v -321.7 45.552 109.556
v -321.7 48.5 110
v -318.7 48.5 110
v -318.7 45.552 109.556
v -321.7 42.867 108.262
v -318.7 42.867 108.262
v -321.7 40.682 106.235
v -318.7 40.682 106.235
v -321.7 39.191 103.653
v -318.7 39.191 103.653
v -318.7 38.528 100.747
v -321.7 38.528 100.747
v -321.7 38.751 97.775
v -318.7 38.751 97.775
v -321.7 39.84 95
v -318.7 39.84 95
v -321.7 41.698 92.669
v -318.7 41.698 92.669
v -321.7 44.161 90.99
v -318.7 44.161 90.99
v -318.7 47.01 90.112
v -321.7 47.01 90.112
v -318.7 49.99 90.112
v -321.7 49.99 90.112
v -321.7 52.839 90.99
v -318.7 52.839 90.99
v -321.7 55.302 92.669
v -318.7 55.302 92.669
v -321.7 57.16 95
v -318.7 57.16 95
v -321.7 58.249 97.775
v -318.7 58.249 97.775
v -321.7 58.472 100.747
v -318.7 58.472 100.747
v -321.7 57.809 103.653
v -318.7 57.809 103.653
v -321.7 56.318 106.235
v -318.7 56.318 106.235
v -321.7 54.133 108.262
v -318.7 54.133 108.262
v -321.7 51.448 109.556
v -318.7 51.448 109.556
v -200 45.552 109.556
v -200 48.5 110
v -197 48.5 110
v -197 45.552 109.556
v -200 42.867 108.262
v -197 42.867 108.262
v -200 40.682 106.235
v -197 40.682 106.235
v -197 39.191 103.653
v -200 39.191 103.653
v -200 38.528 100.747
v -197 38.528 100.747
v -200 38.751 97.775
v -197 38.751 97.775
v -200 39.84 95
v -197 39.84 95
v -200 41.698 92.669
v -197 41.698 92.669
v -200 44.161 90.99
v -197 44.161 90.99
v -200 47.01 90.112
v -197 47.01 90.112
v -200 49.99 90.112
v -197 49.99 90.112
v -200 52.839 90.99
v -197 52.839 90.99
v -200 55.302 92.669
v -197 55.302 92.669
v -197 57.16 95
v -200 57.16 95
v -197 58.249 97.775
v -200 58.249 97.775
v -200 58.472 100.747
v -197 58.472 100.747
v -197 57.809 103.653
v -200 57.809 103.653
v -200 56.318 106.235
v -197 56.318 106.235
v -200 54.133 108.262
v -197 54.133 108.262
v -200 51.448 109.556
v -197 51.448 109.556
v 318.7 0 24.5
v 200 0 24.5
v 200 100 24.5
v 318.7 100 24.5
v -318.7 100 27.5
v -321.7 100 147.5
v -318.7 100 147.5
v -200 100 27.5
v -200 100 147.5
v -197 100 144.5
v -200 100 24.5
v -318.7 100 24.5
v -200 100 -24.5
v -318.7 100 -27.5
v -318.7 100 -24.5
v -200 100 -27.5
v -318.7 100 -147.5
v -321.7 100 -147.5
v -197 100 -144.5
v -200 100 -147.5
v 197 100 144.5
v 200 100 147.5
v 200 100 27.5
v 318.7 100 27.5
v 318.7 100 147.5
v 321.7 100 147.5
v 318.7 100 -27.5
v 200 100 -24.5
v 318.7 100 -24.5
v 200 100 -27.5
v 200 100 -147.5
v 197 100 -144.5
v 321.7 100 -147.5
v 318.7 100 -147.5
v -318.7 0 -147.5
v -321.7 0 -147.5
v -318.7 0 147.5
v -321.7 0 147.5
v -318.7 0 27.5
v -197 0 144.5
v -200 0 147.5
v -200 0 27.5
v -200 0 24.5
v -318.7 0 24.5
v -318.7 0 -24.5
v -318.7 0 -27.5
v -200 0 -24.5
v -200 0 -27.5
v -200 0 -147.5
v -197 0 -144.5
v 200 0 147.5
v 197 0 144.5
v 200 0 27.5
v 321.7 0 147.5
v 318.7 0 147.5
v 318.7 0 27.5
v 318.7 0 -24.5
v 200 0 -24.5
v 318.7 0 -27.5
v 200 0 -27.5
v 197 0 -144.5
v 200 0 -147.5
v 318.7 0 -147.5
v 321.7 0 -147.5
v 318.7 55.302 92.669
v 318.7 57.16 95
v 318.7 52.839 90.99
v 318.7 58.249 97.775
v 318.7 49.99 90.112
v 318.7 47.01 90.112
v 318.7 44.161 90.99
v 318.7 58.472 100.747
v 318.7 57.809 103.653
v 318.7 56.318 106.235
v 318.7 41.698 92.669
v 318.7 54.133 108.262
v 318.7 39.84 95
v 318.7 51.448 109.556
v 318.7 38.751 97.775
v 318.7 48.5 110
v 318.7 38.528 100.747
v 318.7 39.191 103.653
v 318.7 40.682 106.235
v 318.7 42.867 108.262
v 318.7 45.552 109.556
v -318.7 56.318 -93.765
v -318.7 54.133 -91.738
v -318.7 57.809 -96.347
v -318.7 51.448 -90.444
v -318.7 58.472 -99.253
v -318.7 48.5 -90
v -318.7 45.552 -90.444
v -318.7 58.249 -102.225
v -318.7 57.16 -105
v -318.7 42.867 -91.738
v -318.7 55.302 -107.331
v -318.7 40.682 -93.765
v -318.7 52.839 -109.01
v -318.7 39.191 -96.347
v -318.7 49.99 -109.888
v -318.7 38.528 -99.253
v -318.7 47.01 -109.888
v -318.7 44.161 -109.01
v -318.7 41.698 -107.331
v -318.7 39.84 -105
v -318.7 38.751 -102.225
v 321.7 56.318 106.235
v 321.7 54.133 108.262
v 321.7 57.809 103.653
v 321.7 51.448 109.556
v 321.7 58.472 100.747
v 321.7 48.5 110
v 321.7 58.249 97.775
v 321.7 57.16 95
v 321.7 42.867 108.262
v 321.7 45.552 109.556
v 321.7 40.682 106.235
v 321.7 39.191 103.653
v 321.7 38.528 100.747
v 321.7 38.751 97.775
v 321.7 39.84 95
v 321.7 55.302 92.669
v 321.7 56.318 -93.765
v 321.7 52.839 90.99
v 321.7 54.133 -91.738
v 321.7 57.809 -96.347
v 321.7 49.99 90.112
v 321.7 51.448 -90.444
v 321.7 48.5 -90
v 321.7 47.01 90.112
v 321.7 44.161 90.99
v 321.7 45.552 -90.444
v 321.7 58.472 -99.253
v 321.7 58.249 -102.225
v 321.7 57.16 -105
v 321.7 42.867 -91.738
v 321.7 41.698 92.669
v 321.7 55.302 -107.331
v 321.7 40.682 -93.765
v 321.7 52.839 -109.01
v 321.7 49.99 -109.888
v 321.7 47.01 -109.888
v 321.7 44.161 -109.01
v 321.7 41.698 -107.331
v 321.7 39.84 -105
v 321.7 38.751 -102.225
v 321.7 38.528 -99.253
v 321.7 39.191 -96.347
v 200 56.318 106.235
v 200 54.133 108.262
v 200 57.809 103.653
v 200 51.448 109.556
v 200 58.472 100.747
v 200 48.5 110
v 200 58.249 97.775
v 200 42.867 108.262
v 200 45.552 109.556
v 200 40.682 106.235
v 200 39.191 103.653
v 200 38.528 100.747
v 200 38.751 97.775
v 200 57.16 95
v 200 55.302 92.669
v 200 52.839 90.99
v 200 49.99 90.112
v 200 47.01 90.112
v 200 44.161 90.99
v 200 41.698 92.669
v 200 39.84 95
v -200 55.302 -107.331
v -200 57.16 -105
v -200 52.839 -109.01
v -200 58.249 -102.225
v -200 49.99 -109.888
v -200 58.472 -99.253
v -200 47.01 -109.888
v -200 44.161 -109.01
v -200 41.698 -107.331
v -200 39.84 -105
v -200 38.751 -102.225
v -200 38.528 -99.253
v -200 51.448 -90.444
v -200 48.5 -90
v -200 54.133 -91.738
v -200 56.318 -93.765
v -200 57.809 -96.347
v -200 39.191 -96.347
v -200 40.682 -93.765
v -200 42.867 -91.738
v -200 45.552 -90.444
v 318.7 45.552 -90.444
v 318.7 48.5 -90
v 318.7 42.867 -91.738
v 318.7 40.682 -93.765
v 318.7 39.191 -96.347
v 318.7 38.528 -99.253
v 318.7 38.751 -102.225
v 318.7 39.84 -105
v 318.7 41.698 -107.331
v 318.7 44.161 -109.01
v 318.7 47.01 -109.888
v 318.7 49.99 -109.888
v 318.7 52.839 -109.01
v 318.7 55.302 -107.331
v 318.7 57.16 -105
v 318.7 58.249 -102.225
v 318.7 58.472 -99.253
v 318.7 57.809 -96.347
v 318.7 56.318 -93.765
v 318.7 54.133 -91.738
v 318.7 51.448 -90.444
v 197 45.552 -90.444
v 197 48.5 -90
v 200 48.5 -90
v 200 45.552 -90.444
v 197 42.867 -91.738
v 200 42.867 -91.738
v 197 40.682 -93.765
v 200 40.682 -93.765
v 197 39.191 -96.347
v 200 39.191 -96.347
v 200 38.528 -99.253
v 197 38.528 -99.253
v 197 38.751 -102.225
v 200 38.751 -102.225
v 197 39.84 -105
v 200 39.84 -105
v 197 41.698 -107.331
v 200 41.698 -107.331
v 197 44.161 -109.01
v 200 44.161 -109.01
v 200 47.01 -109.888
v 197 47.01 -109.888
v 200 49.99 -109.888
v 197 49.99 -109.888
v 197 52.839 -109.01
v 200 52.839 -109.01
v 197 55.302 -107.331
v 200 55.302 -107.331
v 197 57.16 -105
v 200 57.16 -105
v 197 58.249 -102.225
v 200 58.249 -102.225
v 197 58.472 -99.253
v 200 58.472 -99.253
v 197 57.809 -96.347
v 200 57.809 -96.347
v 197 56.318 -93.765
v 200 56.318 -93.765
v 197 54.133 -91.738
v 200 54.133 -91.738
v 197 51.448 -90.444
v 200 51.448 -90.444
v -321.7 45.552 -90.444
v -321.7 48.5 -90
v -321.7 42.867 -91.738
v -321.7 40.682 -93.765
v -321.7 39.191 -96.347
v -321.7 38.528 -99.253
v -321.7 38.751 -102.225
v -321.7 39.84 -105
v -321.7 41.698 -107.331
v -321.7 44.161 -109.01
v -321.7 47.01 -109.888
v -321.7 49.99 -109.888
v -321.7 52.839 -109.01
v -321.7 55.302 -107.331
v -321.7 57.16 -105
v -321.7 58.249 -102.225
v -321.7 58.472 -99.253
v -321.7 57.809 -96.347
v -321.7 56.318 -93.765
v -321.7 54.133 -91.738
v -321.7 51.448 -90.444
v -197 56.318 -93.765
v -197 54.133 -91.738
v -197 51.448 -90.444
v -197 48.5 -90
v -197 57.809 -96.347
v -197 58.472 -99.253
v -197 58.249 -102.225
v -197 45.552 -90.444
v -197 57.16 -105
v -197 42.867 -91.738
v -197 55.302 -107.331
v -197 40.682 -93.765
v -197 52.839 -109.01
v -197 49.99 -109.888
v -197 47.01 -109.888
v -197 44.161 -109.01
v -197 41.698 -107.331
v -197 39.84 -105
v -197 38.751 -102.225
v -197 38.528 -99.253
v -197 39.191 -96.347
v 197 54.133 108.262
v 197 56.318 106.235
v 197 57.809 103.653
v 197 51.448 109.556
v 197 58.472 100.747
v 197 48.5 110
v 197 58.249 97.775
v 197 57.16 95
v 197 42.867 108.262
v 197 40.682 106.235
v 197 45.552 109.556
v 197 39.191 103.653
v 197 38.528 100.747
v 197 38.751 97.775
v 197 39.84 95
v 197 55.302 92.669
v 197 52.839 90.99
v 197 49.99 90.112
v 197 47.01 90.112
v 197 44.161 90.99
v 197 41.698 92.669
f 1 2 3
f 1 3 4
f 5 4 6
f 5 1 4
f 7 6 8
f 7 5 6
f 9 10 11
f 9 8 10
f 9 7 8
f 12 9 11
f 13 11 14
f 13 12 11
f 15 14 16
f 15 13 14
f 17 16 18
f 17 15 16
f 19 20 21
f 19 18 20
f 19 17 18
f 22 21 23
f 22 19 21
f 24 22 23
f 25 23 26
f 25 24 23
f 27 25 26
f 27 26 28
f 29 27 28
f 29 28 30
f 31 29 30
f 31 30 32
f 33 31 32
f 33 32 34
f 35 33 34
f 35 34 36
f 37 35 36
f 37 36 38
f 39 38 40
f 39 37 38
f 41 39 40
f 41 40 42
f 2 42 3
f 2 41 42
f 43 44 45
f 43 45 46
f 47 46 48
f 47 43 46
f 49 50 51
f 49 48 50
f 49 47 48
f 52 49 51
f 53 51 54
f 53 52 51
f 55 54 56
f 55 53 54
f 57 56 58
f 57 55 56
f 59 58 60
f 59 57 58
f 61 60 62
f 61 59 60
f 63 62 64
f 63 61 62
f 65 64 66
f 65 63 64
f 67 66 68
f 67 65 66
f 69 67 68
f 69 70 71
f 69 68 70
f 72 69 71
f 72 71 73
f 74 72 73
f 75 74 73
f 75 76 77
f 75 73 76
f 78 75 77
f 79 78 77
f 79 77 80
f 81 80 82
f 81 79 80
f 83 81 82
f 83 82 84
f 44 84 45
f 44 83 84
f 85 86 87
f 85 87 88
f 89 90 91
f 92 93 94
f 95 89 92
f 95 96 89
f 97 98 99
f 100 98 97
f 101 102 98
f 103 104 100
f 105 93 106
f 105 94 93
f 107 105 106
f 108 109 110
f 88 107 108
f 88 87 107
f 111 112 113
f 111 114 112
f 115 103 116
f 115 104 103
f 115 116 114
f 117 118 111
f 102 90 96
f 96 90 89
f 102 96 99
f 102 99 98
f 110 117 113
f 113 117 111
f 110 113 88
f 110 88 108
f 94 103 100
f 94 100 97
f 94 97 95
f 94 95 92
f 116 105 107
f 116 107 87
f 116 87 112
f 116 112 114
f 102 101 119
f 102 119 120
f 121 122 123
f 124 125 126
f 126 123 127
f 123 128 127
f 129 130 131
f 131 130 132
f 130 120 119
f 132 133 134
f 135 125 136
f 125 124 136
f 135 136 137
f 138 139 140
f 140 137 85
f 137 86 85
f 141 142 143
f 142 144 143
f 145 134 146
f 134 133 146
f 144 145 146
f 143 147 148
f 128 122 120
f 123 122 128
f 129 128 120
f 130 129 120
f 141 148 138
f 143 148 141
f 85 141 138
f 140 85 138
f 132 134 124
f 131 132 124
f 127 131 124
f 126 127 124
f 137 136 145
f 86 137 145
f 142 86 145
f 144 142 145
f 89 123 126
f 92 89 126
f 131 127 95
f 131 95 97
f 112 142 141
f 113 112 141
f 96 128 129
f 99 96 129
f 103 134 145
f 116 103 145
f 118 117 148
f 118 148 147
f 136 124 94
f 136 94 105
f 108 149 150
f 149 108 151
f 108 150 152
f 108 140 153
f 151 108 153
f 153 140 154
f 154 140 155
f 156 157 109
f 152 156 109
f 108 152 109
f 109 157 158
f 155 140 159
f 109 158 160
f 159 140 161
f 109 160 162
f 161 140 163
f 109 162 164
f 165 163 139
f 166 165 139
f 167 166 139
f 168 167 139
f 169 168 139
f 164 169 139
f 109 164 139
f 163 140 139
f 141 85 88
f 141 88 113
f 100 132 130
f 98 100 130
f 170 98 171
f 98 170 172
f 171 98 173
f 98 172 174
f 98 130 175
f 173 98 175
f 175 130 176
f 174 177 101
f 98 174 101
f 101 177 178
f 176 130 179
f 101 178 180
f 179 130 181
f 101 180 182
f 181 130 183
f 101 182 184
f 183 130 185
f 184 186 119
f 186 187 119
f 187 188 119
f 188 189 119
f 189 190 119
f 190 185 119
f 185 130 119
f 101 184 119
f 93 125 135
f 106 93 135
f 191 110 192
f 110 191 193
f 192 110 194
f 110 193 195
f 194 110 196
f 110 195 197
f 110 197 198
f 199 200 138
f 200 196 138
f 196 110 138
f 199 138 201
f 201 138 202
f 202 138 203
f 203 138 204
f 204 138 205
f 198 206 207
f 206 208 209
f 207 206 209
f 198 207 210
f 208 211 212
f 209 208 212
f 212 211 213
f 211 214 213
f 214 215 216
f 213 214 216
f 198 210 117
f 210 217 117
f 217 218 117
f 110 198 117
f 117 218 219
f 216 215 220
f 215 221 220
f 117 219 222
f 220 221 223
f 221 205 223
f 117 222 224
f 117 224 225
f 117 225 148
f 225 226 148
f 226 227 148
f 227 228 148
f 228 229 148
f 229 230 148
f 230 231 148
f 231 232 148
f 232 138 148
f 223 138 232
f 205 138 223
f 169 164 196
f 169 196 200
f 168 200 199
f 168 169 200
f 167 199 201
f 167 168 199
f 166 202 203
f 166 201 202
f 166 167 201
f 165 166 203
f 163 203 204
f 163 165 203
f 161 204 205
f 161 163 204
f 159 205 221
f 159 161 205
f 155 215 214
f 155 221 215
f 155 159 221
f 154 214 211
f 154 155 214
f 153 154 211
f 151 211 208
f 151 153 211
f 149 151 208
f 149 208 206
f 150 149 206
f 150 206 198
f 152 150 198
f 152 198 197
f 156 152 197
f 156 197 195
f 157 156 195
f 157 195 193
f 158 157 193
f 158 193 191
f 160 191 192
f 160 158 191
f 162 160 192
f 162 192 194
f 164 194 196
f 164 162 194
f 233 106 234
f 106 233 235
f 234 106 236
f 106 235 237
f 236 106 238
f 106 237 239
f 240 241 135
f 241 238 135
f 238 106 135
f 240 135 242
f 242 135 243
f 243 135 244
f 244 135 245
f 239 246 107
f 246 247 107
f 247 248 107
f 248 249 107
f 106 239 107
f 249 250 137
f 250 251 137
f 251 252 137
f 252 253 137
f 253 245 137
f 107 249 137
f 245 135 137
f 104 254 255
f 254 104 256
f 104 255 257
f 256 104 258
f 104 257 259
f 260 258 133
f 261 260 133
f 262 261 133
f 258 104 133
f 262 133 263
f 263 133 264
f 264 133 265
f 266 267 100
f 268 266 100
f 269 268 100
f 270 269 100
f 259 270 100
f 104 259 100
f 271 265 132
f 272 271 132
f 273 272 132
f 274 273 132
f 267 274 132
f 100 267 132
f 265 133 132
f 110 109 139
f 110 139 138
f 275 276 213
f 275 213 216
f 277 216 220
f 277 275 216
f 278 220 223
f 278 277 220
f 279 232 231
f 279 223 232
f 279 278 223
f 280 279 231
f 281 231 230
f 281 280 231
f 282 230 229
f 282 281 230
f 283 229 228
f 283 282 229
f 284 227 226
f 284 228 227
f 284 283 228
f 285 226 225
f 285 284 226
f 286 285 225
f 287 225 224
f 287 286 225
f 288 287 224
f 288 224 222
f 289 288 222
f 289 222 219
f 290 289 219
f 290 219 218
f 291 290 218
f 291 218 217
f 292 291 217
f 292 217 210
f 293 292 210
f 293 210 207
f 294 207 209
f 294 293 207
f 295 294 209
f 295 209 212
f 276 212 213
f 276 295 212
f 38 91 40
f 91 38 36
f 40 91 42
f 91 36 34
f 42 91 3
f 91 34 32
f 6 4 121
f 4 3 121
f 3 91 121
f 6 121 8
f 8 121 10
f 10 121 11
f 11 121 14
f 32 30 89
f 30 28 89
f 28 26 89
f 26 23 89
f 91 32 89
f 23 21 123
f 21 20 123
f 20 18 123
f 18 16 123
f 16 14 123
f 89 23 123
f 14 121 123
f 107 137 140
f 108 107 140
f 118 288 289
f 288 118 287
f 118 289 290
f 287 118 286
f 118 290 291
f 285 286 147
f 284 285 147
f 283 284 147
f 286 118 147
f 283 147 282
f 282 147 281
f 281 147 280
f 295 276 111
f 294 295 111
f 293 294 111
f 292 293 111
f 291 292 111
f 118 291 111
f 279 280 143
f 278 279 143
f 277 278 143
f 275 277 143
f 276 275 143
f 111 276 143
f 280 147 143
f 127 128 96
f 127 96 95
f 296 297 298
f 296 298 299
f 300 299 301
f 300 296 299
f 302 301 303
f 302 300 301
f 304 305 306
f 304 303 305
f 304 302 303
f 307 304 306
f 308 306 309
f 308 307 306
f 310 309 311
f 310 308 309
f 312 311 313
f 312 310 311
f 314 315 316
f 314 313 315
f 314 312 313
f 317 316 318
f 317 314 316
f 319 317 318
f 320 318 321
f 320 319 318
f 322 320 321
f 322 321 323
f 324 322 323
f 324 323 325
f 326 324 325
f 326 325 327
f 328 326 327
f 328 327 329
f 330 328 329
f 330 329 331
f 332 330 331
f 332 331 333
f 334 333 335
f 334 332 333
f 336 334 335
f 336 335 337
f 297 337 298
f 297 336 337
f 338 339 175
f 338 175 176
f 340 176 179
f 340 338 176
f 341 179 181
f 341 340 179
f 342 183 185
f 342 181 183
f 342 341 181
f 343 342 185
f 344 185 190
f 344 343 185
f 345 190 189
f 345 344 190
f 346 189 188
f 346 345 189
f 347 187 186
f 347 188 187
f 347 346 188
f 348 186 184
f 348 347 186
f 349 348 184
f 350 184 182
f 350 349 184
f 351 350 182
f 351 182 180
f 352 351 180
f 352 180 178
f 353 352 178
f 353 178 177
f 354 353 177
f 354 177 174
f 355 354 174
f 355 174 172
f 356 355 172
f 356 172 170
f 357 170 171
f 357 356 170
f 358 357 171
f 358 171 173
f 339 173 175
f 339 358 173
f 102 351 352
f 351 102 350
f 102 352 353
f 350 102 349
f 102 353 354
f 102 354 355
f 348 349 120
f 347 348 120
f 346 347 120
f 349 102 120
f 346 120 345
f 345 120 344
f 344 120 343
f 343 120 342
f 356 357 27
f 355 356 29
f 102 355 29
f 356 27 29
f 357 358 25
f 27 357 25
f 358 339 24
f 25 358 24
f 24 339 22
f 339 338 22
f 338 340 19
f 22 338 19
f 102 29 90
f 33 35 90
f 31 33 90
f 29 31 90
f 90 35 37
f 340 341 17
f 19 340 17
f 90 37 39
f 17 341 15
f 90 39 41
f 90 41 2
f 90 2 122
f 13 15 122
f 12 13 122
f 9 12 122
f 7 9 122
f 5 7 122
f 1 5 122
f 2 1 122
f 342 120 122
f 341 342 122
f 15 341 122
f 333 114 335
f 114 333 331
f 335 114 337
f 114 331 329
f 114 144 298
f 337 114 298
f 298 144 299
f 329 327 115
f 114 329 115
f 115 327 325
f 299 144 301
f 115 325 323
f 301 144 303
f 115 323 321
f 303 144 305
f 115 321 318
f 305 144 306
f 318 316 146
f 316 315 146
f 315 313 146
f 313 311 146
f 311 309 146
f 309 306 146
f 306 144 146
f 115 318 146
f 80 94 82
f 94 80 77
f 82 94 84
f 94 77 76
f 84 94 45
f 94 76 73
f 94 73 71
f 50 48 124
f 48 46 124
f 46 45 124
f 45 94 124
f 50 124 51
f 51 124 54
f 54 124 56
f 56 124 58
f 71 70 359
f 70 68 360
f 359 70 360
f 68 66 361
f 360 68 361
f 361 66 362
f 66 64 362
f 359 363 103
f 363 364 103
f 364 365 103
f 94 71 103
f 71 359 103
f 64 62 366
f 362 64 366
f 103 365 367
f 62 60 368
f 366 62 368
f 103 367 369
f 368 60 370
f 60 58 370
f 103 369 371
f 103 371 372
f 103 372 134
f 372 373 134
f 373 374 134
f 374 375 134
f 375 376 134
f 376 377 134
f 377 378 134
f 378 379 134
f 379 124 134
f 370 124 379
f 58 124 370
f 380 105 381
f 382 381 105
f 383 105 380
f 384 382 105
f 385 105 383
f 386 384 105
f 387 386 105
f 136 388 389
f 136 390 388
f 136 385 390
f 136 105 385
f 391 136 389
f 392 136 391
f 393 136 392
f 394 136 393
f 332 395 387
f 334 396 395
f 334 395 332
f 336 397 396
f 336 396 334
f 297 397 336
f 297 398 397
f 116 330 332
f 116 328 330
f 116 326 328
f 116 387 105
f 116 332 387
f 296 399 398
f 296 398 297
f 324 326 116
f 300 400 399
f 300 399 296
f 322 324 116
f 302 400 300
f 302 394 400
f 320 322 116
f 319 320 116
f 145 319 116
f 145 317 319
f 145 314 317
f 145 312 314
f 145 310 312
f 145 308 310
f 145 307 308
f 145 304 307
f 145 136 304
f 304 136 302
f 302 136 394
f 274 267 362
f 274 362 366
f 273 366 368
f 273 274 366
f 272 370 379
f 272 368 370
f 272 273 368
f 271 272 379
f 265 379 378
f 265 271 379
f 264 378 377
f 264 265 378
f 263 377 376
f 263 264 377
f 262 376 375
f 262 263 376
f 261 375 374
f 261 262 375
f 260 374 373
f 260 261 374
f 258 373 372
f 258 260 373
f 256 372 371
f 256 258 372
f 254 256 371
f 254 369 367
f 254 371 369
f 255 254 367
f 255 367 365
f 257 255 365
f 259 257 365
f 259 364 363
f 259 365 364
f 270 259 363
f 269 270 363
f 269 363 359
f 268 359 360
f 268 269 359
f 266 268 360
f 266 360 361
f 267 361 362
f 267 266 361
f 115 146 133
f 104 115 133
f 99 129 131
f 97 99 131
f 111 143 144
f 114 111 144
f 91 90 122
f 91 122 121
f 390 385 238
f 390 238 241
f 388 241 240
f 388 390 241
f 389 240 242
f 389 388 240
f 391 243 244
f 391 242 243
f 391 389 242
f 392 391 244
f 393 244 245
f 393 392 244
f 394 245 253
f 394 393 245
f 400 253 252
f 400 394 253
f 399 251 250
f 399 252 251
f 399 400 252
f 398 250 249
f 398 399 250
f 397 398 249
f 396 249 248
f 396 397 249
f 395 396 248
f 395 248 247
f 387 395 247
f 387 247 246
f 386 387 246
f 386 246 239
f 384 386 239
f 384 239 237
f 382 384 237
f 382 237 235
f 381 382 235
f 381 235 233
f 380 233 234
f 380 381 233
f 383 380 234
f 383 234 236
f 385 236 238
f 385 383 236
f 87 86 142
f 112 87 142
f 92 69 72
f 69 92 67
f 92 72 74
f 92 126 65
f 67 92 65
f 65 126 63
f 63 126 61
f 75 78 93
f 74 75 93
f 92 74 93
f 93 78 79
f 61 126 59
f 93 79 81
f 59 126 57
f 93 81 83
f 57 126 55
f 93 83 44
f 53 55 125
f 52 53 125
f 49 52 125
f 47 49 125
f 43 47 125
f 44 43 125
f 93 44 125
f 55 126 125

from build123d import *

# Parameters (mm, degrees)
SKETCH1_W               = 118.7
SKETCH1_H               = 49
SKETCH1_W_2             = 394
SKETCH1_H_2             = 289
BOSS_EXTRUDE1_DEPTH     = 100
CUT_EXTRUDE1_DEPTH      = 668.622505612
CUT_EXTRUDE1_DEPTH_BACK = 668.622505612
SKETCH3_R               = 10


with BuildPart() as part:
    # Sketch1 → Boss-Extrude1 (new body)
    with BuildSketch(Plane(origin=(0, 0, 0), x_dir=(1, 0, 0), z_dir=(0, 1, 0))):
        Polygon((200, 147.5), (-200, 147.5), (-200, 27.5), (-318.7, 27.5), (-318.7, 147.5), (-321.7, 147.5), (-321.7, -147.5), (-318.7, -147.5), (-318.7, -27.5), (-200, -27.5), (-200, -147.5), (200, -147.5), (200, -27.5), (318.7, -27.5), (318.7, -147.5), (321.7, -147.5), (321.7, 147.5), (318.7, 147.5), (318.7, 27.5), (200, 27.5), align=None)
        with Locations((259.35, 0)):
            Rectangle(SKETCH1_W, SKETCH1_H, mode=Mode.SUBTRACT)
        with Locations((-259.35, 0)):
            Rectangle(SKETCH1_W, SKETCH1_H, mode=Mode.SUBTRACT)
        Rectangle(SKETCH1_W_2, SKETCH1_H_2, mode=Mode.SUBTRACT)
    extrude(amount=BOSS_EXTRUDE1_DEPTH)

    # Sketch3 → Cut-Extrude1 (cut, two sides: drawn at the far end of the back side and taken through both)
    with BuildSketch(Plane(origin=(321.7, 0, 0), x_dir=(0, 0, -1), z_dir=(1, 0, 0)).offset(-CUT_EXTRUDE1_DEPTH_BACK)):
        with Locations(Location((-100, 48.5, 0), (0, 0, 180))):
            Circle(SKETCH3_R)
        with Locations(Location((100, 48.5, 0), (0, 0, 180))):
            Circle(SKETCH3_R)
    extrude(amount=CUT_EXTRUDE1_DEPTH + CUT_EXTRUDE1_DEPTH_BACK, mode=Mode.SUBTRACT)


solid = part.part
